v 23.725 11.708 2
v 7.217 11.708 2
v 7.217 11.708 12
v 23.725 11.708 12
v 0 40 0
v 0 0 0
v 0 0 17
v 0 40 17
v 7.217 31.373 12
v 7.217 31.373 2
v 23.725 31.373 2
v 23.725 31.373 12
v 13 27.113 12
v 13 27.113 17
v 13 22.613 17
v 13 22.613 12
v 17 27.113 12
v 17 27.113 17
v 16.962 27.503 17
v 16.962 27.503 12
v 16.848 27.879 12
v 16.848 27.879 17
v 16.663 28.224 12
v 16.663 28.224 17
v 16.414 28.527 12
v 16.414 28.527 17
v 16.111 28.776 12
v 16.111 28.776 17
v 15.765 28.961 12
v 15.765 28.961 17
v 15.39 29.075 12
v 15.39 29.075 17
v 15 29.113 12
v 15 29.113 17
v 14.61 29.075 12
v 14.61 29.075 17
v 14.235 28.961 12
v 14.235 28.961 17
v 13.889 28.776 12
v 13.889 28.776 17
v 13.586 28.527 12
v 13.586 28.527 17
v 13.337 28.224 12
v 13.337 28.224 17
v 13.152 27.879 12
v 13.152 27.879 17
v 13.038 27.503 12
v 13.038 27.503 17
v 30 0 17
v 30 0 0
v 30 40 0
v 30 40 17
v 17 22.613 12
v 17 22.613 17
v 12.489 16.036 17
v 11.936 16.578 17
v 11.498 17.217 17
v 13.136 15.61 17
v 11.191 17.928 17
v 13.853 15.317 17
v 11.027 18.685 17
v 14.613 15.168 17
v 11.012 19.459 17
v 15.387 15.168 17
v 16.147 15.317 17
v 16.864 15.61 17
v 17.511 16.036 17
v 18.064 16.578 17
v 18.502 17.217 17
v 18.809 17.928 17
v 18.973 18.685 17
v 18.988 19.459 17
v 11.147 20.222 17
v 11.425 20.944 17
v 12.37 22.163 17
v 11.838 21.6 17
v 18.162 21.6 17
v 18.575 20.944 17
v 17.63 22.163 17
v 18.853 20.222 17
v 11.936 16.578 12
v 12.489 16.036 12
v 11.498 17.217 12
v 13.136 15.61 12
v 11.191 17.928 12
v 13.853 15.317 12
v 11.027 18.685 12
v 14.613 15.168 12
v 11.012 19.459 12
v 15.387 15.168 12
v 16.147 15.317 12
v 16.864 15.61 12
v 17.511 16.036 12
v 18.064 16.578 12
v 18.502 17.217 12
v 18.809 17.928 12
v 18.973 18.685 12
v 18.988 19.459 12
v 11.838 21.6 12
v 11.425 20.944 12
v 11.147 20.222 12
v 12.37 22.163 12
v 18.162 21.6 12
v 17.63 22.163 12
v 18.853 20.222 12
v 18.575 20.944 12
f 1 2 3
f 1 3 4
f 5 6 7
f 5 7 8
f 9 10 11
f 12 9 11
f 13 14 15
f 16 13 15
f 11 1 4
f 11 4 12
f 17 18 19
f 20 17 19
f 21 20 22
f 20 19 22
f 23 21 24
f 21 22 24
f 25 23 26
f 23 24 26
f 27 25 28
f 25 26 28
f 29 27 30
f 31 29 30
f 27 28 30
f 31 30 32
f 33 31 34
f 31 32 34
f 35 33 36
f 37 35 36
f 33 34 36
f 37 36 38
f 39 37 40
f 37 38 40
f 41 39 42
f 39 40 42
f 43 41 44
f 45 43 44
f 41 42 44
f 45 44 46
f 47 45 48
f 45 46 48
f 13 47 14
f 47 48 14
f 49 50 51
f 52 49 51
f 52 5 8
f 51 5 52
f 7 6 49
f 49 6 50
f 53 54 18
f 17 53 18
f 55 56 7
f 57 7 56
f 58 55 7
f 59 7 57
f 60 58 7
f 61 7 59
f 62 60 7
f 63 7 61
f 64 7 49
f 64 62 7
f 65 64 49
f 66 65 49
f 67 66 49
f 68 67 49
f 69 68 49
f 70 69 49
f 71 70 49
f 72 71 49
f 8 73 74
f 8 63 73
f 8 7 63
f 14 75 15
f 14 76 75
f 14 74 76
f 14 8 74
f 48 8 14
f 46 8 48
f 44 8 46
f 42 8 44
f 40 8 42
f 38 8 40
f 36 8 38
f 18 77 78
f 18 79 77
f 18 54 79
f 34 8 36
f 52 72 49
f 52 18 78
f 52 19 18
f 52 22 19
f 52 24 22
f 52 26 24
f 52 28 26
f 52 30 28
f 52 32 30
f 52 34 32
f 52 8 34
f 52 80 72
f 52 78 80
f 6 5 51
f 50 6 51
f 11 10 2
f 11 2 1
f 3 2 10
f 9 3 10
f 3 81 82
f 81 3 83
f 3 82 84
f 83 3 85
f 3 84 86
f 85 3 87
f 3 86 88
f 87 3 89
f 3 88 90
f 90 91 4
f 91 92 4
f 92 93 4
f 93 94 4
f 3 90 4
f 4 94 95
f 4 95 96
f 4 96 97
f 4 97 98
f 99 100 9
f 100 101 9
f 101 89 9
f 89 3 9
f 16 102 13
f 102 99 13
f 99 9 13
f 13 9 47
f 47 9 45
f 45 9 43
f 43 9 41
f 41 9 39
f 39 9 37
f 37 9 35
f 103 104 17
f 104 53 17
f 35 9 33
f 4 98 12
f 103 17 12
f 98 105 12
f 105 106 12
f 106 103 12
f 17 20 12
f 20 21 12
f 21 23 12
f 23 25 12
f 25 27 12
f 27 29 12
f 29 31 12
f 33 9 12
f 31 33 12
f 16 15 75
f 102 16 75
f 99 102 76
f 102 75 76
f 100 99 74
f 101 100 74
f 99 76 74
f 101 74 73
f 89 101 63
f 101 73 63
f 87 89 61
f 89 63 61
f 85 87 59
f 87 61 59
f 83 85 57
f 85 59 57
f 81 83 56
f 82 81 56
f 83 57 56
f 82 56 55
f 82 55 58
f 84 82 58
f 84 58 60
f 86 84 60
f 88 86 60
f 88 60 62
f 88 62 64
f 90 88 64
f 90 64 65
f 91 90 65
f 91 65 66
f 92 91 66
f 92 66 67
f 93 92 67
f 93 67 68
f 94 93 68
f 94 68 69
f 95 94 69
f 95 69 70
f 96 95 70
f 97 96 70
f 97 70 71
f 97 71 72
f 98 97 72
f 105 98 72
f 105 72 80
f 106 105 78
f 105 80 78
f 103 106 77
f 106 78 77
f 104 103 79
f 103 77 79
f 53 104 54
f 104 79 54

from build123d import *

# Parameters (mm, degrees)
F0_W     = 30
F0_H     = 40
F1_DEPTH = 17
F3_DEPTH = 15
F4_W     = 16.507677
F4_H     = 19.664884
F5_DEPTH = 10


with BuildPart() as f1:
    # F0 (on Top) → F1 (new body)
    with BuildSketch(Plane.XY):
        with Locations((15, 20)):
            Rectangle(F0_W, F0_H)
    extrude(amount=F1_DEPTH)

    # F2 (on face) → F3 (cut)
    with BuildSketch(Plane.XY.offset(17)):
        with BuildLine():
            Line((13, 27.113265), (13, 22.613265))
            ThreePointArc((13, 22.613265), (15, 15.149164), (17, 22.613265))
            Line((17, 22.613265), (17, 27.113265))
            ThreePointArc((17, 27.113265), (15, 29.113265), (13, 27.113265))
        make_face()
    extrude(amount=-F3_DEPTH, mode=Mode.SUBTRACT)

    # F4 (on face) → F5 (cut)
    with BuildSketch(Plane.XY.offset(2)):
        with Locations((15.471233, 21.540843)):
            Rectangle(F4_W, F4_H)
    extrude(amount=F5_DEPTH, mode=Mode.SUBTRACT)


solid = f1.part
